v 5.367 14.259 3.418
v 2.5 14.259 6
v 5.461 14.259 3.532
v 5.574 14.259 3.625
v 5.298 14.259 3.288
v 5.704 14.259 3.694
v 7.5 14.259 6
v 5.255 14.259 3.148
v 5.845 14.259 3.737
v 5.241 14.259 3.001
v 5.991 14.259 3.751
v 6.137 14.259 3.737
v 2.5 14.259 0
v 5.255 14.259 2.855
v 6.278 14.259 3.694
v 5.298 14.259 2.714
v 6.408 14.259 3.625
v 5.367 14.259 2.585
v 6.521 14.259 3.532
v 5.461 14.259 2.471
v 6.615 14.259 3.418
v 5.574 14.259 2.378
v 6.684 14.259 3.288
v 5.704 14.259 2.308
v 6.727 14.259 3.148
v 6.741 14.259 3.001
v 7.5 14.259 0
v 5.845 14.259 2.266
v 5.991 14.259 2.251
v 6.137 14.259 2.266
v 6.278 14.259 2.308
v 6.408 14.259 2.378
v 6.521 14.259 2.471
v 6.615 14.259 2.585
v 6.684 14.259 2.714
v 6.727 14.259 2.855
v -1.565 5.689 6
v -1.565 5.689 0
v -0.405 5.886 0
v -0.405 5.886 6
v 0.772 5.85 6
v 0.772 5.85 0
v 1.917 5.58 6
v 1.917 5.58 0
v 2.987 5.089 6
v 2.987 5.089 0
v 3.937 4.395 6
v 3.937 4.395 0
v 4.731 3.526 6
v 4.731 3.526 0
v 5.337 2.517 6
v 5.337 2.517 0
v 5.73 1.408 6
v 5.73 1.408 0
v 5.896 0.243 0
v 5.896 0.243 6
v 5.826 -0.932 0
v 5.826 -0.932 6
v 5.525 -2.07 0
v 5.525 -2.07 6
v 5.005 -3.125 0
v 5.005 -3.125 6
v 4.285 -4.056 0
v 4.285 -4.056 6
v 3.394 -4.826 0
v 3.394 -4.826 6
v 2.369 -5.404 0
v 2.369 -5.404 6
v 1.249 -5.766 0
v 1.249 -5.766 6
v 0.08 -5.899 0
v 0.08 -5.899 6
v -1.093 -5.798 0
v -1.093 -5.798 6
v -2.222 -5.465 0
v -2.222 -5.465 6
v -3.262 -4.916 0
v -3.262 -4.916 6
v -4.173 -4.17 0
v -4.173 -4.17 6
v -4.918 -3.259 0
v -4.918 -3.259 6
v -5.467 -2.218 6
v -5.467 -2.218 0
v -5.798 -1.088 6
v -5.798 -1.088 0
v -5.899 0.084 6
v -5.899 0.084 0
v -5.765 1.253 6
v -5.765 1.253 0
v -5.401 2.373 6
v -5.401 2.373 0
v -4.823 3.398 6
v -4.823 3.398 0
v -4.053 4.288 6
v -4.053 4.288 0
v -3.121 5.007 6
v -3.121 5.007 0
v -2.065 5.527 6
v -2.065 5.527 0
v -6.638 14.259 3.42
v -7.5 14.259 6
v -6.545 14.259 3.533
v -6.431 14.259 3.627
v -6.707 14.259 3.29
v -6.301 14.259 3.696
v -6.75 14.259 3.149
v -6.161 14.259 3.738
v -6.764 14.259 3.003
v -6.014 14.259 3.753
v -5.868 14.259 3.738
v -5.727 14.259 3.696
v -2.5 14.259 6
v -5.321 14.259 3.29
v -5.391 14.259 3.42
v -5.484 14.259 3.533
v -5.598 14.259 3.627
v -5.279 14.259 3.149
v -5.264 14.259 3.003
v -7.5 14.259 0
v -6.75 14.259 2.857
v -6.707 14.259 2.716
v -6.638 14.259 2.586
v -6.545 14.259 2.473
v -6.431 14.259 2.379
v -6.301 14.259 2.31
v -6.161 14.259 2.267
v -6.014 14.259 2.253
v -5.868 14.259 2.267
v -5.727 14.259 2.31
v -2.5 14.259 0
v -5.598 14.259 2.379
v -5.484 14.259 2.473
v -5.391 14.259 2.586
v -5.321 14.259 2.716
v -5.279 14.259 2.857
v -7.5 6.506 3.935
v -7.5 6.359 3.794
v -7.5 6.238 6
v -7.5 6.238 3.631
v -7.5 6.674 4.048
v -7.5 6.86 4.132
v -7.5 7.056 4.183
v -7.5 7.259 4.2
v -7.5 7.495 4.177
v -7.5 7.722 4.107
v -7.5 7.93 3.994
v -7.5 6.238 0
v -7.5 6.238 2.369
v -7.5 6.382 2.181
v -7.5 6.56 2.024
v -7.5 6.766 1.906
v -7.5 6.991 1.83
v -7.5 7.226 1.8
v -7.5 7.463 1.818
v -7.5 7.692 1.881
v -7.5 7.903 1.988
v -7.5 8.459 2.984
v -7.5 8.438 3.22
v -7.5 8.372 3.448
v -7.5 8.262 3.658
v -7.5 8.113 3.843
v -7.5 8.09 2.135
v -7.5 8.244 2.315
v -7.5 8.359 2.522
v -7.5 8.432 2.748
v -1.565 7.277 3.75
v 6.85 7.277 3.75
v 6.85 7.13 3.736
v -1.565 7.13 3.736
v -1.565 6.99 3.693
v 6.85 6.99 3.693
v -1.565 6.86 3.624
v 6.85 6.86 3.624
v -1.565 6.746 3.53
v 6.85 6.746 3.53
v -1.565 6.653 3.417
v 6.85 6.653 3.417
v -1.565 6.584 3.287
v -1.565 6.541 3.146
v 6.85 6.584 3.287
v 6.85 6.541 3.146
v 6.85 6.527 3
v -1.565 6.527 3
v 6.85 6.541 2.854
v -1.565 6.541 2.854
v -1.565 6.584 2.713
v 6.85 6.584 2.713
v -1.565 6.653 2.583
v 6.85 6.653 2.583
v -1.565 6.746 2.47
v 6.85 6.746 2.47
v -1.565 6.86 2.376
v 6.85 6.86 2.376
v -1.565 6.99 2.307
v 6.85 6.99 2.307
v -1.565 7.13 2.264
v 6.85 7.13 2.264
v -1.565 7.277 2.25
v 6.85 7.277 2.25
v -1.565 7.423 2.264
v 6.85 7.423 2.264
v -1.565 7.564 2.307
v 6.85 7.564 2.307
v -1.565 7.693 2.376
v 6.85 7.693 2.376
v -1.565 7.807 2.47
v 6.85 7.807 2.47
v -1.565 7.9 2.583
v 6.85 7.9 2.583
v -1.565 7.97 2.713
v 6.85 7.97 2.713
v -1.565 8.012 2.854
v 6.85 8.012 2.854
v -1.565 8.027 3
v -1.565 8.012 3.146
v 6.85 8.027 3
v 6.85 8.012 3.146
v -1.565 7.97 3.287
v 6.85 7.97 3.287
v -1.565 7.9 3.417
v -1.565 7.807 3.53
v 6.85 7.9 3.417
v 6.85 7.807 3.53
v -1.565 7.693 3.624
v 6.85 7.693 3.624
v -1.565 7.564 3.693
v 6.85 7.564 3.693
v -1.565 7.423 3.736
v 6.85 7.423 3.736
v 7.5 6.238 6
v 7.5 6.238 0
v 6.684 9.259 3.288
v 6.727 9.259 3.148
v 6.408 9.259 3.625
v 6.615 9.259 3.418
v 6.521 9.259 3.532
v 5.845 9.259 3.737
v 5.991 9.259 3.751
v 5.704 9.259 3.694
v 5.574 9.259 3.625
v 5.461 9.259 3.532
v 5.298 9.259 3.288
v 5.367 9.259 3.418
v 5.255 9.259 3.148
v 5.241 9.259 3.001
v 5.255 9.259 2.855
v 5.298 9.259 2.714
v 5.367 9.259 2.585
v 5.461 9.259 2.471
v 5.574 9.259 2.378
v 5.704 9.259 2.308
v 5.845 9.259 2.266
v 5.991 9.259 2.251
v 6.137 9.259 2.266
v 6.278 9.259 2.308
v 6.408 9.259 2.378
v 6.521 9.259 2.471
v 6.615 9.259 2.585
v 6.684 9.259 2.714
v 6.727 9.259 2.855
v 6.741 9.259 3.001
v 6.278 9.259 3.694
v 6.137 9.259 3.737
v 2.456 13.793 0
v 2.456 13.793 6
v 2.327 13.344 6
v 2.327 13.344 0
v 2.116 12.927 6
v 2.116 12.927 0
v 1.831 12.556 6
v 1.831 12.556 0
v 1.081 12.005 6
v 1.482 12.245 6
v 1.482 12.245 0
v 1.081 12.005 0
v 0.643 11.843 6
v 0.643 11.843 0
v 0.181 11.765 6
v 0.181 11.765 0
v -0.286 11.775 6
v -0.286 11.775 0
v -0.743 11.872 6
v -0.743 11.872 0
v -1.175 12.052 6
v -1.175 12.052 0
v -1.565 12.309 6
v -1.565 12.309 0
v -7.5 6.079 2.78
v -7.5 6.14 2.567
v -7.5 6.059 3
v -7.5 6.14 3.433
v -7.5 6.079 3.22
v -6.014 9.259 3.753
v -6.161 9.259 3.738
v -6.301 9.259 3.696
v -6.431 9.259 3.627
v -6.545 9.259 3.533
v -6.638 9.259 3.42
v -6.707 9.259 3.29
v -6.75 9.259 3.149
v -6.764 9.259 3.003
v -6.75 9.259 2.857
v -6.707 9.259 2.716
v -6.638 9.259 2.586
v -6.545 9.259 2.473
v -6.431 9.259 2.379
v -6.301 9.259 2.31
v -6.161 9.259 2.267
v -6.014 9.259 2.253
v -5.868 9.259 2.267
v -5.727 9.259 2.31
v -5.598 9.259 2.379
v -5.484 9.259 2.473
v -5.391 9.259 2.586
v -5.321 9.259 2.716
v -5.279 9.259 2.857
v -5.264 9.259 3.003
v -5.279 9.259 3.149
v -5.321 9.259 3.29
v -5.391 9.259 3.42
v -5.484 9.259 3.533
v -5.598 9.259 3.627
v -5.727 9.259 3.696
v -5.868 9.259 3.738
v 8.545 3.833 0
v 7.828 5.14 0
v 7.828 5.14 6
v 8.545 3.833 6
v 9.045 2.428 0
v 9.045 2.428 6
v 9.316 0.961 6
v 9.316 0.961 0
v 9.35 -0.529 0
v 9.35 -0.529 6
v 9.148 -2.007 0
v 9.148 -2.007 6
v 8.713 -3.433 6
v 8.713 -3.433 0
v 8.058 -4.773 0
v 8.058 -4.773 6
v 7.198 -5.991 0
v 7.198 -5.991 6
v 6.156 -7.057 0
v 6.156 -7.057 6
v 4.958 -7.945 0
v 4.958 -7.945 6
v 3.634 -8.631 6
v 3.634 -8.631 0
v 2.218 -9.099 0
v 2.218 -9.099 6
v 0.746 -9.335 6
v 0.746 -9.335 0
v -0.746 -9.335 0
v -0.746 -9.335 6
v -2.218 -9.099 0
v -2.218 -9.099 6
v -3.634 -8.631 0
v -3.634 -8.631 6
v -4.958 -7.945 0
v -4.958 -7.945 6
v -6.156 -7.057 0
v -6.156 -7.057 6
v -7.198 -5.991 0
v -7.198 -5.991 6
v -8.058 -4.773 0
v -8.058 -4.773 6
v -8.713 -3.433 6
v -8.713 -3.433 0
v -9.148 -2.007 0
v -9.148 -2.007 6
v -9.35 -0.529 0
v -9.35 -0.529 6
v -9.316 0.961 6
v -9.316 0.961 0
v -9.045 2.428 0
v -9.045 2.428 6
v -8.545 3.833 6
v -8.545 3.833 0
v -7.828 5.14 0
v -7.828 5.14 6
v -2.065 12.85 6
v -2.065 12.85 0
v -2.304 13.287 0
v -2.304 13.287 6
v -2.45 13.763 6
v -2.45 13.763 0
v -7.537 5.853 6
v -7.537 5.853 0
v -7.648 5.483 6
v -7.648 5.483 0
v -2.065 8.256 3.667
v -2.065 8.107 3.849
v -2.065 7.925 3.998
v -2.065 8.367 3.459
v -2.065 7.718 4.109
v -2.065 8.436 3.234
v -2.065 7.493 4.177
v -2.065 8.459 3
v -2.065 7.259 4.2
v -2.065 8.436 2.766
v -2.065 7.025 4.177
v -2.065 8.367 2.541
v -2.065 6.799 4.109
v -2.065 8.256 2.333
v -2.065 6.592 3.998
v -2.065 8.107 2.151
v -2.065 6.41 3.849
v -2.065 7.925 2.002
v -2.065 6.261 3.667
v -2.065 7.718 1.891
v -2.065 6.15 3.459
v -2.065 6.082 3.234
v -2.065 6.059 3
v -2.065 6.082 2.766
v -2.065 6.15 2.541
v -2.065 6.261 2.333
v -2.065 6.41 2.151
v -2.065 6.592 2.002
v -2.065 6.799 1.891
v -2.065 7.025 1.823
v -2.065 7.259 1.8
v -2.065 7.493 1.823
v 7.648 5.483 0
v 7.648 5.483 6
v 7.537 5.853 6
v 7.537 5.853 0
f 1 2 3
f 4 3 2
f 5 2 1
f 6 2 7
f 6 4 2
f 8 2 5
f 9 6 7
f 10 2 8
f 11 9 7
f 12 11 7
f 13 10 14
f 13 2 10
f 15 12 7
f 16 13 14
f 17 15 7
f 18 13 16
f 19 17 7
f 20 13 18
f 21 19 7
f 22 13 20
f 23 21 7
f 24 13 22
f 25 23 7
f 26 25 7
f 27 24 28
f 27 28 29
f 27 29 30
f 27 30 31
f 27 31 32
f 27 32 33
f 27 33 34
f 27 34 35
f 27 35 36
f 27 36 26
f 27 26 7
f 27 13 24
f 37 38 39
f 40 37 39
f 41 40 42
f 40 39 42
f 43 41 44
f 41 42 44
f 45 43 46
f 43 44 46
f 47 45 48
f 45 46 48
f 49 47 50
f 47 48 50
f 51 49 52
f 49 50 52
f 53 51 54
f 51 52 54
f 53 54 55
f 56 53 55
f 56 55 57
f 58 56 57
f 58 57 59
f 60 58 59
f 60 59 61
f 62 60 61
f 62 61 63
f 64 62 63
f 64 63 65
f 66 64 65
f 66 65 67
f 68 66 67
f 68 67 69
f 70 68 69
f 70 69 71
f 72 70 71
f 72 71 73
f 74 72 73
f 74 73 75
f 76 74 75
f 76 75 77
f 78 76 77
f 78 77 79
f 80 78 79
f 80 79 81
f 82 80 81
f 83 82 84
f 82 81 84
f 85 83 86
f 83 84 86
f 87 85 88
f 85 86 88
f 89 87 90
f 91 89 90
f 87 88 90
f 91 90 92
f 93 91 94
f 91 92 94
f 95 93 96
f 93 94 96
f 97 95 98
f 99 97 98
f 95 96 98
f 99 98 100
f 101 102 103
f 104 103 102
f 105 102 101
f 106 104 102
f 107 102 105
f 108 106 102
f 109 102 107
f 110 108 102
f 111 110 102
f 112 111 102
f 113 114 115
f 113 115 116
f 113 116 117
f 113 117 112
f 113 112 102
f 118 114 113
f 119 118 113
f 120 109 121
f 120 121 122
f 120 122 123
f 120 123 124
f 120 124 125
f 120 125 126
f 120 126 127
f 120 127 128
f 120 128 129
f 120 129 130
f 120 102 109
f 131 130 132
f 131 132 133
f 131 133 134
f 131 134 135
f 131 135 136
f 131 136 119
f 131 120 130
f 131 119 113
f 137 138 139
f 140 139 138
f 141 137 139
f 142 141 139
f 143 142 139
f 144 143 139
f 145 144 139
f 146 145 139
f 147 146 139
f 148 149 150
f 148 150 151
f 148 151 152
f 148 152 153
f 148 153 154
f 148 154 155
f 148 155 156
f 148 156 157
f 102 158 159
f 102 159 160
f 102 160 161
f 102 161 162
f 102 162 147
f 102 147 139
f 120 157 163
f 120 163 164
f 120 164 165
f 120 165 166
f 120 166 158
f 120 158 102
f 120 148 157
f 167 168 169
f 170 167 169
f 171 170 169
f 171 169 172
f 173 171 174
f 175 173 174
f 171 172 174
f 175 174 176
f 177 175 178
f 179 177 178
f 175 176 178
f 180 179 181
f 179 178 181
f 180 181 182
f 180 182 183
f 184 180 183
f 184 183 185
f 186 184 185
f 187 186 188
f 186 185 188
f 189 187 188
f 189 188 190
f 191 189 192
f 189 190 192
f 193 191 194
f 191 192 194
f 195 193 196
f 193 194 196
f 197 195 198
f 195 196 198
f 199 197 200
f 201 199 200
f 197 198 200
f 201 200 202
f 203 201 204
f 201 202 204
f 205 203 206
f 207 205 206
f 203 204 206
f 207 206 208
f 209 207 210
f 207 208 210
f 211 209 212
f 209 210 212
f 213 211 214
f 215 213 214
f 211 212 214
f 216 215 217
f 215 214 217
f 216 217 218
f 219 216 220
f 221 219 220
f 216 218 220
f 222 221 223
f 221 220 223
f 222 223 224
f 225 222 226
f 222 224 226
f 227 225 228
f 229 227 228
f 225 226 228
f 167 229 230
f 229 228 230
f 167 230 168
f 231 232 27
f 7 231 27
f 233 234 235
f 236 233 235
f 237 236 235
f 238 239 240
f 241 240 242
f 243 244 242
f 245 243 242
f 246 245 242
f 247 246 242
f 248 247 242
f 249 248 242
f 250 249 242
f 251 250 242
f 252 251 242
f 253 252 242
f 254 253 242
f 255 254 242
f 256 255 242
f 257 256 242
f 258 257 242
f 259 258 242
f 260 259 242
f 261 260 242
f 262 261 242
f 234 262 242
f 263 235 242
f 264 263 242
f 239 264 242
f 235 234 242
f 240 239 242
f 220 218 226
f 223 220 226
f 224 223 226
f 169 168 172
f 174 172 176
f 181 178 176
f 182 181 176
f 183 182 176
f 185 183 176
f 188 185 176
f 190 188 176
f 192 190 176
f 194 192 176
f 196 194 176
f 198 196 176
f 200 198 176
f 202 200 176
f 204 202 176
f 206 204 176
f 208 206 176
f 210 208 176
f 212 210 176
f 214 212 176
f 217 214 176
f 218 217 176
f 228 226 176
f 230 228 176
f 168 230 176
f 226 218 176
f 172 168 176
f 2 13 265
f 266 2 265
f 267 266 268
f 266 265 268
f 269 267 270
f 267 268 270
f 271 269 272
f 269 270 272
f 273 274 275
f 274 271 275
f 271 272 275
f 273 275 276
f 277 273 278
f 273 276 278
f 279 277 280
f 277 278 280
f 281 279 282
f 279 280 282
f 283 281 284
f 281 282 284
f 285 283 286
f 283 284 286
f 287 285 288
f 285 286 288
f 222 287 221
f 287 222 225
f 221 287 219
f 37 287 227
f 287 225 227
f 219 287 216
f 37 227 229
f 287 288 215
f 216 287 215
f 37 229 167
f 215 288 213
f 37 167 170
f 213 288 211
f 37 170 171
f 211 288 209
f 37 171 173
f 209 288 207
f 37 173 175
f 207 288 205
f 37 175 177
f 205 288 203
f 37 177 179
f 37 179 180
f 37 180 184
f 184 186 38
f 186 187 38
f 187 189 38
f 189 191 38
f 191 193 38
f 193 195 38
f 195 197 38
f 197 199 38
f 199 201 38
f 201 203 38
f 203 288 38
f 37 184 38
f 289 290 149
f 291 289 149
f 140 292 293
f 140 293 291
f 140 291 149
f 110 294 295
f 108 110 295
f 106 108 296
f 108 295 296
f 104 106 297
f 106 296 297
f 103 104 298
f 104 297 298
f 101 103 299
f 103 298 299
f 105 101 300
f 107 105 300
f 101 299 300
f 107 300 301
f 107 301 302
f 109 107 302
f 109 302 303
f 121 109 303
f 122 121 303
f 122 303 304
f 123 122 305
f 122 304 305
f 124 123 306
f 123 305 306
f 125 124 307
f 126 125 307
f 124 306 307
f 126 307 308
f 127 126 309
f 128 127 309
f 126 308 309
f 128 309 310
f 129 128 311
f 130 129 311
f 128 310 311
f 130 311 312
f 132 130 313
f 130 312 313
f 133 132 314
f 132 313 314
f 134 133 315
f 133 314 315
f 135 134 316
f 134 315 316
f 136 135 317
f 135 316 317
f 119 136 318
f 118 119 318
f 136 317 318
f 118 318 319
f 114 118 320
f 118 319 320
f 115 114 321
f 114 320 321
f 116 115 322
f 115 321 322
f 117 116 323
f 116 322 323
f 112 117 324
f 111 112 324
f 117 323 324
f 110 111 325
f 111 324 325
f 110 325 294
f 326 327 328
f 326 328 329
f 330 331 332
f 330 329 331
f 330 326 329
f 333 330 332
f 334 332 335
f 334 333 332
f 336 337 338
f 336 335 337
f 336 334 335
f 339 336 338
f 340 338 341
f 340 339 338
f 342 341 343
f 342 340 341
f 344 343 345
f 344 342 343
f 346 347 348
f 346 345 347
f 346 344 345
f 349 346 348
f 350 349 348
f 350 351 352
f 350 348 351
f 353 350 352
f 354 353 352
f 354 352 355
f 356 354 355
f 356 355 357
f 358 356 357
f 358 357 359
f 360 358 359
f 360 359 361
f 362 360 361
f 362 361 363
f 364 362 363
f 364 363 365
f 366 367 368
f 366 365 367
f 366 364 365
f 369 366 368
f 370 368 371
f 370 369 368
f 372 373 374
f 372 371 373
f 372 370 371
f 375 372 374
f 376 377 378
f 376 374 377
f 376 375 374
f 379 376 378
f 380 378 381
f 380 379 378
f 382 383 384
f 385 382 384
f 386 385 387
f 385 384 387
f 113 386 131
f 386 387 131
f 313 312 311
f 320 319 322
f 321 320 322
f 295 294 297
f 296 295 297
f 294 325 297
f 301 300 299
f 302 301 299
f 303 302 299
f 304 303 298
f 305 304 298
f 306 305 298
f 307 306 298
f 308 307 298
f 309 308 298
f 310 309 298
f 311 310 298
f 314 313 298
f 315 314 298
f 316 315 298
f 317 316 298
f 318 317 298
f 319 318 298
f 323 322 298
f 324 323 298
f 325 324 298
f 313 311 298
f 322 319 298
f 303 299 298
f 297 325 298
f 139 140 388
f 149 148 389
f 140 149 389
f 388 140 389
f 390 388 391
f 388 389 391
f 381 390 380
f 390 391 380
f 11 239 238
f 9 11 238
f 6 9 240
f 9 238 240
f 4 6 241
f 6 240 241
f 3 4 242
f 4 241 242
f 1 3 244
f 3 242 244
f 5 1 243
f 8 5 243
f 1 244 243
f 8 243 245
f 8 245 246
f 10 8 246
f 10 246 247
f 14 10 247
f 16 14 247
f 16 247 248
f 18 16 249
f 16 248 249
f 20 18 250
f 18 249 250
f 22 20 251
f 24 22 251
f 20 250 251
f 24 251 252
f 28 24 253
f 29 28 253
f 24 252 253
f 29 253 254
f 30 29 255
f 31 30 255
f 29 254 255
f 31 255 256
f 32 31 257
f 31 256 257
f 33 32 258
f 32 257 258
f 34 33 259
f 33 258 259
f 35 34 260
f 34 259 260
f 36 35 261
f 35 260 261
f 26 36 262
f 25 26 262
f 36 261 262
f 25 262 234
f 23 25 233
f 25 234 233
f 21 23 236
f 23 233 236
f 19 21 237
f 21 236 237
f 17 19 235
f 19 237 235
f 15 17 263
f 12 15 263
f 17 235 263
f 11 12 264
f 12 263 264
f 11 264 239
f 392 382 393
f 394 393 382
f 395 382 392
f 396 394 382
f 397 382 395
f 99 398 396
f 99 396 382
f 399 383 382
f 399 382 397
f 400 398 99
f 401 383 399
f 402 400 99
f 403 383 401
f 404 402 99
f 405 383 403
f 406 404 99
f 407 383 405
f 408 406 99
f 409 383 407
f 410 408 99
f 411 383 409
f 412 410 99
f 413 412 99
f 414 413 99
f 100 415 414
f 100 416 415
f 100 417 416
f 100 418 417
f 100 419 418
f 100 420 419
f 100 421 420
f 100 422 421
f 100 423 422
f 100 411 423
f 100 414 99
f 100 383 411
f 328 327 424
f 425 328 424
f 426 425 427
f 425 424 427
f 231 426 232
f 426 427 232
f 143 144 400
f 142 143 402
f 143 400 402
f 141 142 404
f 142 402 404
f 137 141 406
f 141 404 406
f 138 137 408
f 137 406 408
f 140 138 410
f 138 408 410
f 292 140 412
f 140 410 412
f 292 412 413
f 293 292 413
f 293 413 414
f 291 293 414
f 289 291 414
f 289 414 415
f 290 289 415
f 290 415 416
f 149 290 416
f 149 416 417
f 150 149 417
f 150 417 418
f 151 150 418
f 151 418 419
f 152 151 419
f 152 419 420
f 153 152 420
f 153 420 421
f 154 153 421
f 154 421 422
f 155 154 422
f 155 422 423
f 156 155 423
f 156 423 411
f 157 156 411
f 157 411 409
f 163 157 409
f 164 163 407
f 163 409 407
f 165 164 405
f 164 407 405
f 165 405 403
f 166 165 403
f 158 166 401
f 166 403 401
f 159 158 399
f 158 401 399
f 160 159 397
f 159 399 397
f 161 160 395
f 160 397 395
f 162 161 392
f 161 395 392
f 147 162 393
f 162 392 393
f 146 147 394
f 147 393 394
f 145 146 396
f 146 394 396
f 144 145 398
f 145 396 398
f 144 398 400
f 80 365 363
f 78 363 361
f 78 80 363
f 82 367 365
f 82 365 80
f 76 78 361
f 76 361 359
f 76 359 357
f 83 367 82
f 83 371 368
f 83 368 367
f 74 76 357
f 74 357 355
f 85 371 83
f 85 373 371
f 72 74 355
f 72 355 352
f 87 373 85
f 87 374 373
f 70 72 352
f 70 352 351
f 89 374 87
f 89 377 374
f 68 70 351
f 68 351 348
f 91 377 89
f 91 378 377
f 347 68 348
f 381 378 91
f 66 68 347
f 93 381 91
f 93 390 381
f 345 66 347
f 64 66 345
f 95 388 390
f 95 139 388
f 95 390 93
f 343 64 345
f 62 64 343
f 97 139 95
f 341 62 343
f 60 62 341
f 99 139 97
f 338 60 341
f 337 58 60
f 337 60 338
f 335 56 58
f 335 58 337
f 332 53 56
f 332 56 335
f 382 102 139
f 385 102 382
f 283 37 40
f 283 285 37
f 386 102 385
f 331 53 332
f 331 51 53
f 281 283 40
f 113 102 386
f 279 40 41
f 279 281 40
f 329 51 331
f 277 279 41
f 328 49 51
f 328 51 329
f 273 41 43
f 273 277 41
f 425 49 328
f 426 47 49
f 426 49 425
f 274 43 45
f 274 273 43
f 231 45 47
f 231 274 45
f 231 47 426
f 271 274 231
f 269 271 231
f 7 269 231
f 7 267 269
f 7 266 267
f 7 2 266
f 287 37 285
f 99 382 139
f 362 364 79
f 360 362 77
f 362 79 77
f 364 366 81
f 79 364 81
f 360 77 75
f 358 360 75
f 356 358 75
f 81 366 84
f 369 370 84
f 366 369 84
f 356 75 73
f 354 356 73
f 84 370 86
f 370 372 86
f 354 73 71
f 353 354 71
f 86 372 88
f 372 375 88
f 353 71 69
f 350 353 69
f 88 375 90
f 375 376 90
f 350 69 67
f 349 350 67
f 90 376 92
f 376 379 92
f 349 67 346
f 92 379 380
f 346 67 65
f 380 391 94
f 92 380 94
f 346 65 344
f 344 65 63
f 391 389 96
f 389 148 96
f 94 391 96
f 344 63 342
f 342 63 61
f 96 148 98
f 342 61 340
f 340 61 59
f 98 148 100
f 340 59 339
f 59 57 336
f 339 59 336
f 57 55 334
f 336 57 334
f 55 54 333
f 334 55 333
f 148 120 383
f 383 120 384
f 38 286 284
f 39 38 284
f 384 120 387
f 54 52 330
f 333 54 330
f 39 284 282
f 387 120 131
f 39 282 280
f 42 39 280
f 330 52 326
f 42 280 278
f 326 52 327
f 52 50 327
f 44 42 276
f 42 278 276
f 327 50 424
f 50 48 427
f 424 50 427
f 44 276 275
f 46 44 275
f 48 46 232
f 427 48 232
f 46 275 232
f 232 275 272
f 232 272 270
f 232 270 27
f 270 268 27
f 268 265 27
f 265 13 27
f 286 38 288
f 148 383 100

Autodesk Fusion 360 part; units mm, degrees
sketch "Sketch1" plane through (0, 0, 0) normal (0, 0, 1) x (1, 0, 0)
  line L0 (-7.5, 14.2587) -> (-2.5, 14.2587)
  line L1 (-2.0653, 12.85) -> (-2.0653, 5.5267)
  arc A0 (-7.8282, 5.1403) -> (7.8282, 5.1403) centre (0, 0) ccw
  line L2 (-1.565, 12.3091) -> (-1.565, 5.6887)
  line L3 (-2.0653, 5.5267) -> (-2.0653, 12.85)
  line L4 (-7.5, 14.2587) -> (-2.5, 14.2587)
  line L5 (2.5, 14.2587) -> (7.5, 14.2587)
  arc A1 (-2.0653, 5.5267) -> (-1.565, 5.6887) centre (0, 0) ccw
  line L6 (-2.5, -19.9263) -> (2.5, -19.9263)
  arc A2 (-1.565, 12.3091) -> (2.5, 14.2587) centre (0, 14.2587) ccw
  arc A3 (-2.5, 14.2587) -> (-2.0653, 12.85) centre (0, 14.2587) ccw
  line L7 (0, 0) -> (-7.5, 0)
  line L8 (-7.5, 6.238) -> (-7.5, 14.2587)
  line L9 (0, 0) -> (7.5, 0)
  line L10 (7.5, 6.238) -> (7.5, 14.2587)
  line L11 (0, 17.4341) -> (0, 17.3504)
  arc A4 (-7.8282, 5.1403) -> (-7.5, 6.238) centre (-9.5, 6.238) ccw
  arc A5 (7.5, 6.238) -> (7.8282, 5.1403) centre (9.5, 6.238) ccw
  dimension "d1" = 11.8
  dimension "d5" = 5
  dimension "d25" = 7.5
  dimension "d26" = 7.5
  dimension "d27" = 2
extrude "Extrude1" add sketch "Sketch1" along normal blind 6 contours L0 L1 A0 L2 L3 L4 L5 A1 A2 A3 L8 L10 A4 A5
hole "Hole1" at (-7.5, 7.2587, 3) direction (1, 0, 0) diameter 2.4 depth 5.6892 tip angle 180
hole "Hole2" at (-1.565, 7.2768, 3) direction (1, 0, 0) diameter 1.5 depth 8.4147 tip angle 180
sketch "Sketch2" plane through (0, 14.2587, 0) normal (0, 1, 0) x (-1, 0, 0)
  line L0 (7.5233, 0) -> (-7.4993, 0)
  line L1 (-7.4993, 0) -> (-7.4993, 6.0044)
  line L2 (-7.4993, 6.0044) -> (7.5233, 6.0044)
  line L3 (7.5233, 6.0044) -> (7.5233, 0)
  line L4 (7.5233, 3.0022) -> (-7.4993, 3.0022)
  line L5 (6.012, 2.0757) -> (-5.988, 2.0757)
  line L6 (-5.988, 2.0757) -> (-5.988, 3.9288)
  line L7 (-5.988, 3.9288) -> (6.012, 3.9288)
  line L8 (6.012, 3.9288) -> (6.012, 2.0757)
  line L9 (6.012, 2.0757) -> (-5.988, 3.9288) construction
  line L10 (-5.988, 2.0757) -> (6.012, 3.9288) construction
  point P0 (0.012, 3.0022)
  dimension "d30" = 12
hole "Hole3" at (5.991, 14.2587, 3.0012) direction (0, -1, 0) diameter 1.5 depth 5 tip angle 180
hole "Hole4" at (-6.0143, 14.2587, 3.0029) direction (0, -1, 0) diameter 1.5 depth 5 tip angle 180
